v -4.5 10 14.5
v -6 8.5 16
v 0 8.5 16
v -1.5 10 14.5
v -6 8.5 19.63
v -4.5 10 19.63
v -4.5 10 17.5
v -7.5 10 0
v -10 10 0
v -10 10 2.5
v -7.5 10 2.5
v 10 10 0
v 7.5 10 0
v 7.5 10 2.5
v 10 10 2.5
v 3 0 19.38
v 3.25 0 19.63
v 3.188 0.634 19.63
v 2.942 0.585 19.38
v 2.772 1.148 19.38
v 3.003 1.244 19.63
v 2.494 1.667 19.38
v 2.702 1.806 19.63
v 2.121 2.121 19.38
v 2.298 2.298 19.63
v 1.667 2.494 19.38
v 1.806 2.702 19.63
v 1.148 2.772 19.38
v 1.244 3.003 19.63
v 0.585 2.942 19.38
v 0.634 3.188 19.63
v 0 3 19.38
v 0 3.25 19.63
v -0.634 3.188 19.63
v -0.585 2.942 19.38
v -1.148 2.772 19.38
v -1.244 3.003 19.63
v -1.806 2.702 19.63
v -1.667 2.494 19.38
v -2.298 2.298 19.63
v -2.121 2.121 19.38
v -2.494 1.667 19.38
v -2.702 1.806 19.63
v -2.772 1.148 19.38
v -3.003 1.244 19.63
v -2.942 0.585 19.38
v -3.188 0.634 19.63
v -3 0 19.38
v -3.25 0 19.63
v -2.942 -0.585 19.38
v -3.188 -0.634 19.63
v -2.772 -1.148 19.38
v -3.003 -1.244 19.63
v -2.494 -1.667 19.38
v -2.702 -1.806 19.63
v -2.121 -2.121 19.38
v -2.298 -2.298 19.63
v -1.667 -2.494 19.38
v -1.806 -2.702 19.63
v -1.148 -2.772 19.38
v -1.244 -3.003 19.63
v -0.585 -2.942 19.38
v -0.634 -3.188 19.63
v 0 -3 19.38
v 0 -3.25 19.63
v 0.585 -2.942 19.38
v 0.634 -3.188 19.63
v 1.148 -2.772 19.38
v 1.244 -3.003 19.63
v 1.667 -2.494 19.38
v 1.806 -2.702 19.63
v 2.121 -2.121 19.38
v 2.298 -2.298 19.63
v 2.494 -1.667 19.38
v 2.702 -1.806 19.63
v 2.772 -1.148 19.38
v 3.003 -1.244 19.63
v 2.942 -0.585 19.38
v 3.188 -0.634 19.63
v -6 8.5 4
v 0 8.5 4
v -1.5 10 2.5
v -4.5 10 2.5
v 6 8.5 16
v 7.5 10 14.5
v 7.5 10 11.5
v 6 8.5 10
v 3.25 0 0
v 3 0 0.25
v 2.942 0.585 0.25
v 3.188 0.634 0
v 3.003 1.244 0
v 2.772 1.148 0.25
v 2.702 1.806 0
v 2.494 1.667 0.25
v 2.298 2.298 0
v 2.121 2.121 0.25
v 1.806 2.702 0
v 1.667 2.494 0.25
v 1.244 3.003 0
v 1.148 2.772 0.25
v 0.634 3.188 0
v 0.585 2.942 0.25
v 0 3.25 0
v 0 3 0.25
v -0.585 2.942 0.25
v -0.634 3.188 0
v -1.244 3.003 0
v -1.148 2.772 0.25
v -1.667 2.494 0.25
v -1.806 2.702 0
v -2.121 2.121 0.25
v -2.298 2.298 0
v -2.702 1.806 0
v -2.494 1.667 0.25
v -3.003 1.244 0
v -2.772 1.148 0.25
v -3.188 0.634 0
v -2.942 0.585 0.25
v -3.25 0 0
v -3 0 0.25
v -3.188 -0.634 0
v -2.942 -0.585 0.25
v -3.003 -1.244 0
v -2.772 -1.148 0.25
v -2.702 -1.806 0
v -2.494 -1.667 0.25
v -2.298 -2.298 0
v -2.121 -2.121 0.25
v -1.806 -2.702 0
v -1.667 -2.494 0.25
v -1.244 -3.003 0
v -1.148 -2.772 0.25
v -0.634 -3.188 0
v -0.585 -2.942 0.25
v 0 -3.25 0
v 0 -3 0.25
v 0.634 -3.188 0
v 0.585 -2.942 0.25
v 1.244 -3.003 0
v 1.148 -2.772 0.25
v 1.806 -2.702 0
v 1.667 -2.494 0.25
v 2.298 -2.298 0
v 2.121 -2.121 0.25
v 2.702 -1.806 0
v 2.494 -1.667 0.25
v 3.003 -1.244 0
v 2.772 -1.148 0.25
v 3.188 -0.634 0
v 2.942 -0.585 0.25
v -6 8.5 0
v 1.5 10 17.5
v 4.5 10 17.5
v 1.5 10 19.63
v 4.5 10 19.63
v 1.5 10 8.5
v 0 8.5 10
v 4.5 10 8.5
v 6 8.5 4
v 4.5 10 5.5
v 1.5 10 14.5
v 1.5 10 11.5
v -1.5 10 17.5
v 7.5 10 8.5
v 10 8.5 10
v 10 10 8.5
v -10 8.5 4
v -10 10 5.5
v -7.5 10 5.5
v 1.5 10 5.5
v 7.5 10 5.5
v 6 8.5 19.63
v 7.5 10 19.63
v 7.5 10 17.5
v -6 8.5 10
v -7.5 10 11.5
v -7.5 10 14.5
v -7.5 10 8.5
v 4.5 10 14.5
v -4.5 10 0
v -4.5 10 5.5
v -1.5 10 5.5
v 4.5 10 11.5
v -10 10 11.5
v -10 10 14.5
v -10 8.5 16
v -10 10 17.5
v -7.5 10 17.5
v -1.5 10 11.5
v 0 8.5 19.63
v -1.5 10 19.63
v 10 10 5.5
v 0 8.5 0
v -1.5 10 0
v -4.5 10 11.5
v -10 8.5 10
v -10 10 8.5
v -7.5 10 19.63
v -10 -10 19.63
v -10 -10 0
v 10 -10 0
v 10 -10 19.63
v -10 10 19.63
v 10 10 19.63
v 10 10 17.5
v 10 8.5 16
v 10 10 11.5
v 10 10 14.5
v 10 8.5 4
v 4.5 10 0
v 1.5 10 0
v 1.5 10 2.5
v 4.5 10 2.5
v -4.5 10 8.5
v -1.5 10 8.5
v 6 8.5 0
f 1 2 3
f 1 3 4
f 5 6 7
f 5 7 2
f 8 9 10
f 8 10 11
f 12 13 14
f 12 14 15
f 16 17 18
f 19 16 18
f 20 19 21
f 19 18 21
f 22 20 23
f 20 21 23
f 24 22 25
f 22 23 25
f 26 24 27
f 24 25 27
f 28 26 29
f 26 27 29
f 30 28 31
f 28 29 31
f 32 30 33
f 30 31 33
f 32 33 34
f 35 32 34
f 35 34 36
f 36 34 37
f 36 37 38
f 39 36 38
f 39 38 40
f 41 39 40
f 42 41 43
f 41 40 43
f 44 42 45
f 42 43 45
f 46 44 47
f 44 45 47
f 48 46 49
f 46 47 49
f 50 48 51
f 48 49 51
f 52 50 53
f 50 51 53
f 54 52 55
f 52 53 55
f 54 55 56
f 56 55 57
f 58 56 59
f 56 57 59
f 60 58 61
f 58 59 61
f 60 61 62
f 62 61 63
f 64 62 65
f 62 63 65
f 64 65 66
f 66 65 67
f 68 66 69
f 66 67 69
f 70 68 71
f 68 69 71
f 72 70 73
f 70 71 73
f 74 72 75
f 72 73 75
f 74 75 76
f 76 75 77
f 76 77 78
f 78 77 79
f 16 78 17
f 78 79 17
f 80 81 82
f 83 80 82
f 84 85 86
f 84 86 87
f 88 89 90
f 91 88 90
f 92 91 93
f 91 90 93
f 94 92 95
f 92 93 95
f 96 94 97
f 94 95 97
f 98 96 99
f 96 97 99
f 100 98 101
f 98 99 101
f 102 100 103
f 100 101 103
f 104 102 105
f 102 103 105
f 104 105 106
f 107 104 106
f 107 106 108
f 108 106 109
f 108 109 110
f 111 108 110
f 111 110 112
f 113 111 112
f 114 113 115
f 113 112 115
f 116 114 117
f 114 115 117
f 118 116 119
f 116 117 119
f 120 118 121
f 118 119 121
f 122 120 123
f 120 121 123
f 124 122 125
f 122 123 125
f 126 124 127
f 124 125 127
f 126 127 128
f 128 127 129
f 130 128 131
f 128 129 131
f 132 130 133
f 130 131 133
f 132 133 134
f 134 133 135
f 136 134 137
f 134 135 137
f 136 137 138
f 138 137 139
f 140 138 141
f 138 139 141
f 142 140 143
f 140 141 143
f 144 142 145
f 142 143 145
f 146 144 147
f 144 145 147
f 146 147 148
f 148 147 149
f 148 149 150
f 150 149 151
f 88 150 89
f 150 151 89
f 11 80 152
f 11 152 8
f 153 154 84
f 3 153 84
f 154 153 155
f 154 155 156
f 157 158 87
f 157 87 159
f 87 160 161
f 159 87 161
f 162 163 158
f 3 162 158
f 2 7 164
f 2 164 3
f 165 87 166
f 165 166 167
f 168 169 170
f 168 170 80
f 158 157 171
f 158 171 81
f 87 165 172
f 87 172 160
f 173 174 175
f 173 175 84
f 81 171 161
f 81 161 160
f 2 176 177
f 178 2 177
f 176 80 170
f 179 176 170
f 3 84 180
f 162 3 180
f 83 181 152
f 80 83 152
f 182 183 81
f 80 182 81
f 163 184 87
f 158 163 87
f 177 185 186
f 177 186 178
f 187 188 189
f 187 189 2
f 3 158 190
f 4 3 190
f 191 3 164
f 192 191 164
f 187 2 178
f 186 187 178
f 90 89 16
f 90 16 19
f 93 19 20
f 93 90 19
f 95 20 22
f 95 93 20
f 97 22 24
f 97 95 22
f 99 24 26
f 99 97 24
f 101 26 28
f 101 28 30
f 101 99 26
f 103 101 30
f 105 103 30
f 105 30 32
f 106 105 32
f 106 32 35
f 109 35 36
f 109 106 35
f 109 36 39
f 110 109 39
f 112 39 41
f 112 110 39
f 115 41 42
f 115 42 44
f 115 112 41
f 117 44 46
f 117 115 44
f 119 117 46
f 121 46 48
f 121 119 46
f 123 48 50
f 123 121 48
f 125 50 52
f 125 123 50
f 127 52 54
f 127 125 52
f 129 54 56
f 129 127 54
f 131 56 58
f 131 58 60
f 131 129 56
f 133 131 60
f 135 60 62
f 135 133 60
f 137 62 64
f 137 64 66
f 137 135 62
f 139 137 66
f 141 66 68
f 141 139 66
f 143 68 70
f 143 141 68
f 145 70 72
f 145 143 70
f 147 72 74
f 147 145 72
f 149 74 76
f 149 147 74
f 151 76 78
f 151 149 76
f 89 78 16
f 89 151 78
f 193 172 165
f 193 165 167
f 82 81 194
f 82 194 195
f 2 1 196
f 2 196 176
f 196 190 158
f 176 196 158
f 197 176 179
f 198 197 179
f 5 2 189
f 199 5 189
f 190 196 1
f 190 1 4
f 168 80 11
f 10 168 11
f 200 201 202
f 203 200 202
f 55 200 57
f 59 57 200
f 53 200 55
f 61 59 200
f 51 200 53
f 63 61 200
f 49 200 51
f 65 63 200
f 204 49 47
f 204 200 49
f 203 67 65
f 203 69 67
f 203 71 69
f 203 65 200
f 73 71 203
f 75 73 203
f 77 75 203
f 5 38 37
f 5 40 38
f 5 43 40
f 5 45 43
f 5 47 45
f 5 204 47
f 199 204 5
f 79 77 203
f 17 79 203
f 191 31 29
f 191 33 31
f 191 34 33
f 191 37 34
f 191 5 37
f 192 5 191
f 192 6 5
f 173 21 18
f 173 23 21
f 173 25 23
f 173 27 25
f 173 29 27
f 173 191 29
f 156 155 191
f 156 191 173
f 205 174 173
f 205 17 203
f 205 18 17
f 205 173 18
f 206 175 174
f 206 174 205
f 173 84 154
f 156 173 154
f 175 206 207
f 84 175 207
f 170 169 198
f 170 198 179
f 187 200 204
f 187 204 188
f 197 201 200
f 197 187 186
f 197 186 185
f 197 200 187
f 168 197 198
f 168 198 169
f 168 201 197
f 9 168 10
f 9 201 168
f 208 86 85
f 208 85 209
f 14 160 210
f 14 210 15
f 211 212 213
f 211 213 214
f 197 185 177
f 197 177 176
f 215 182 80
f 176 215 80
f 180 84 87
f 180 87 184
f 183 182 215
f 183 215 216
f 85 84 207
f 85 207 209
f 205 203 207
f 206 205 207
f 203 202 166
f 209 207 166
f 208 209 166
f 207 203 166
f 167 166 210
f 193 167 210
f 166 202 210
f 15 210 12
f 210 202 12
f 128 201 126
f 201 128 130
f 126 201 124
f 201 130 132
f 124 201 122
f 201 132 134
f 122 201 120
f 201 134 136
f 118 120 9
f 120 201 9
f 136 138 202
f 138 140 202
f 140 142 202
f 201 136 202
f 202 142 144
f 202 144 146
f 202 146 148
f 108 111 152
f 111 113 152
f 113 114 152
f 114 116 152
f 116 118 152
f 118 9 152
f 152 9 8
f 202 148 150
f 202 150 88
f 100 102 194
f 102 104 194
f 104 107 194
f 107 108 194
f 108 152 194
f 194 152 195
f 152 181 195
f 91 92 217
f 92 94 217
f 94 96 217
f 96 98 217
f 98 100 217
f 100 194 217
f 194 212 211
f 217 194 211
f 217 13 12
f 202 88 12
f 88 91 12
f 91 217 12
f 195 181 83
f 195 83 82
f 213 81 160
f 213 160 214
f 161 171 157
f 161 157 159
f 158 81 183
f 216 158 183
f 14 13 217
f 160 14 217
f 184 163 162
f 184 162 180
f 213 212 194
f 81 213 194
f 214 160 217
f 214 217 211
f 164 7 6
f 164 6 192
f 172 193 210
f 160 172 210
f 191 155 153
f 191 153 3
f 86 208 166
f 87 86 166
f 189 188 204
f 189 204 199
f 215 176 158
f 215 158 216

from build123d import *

# Parameters (mm, degrees)
SKETCH1_W           = 20
SKETCH1_H           = 20
SKETCH1_R           = 3
BOSS_EXTRUDE1_DEPTH = 19.63
CUT_EXTRUDE1_DEPTH  = 26
CUT_EXTRUDE2_DEPTH  = 26
CHAMFER1_SIZE       = 0.25
CHAMFER2_SIZE       = 0.25


with BuildPart() as part:
    # Sketch1 → Boss-Extrude1 (new body)
    with BuildSketch(Plane.XY):
        Rectangle(SKETCH1_W, SKETCH1_H)
        Circle(SKETCH1_R, mode=Mode.SUBTRACT)
    extrude(amount=BOSS_EXTRUDE1_DEPTH)

    # Sketch2 → Cut-Extrude1 (cut)
    with BuildSketch(Plane(origin=(0, 0, 0), x_dir=(-1, 0, 0), z_dir=(0, 0, -1))):
        Polygon((-6, 8.5), (-4.5, 10), (-7.5, 10), align=None)
        Polygon((-1.5, 10), (0, 8.5), (1.5, 10), align=None)
        Polygon((7.5, 10), (4.5, 10), (6, 8.5), align=None)
    extrude(amount=-CUT_EXTRUDE1_DEPTH, mode=Mode.SUBTRACT)

    # Sketch3 → Cut-Extrude2 (cut)
    with BuildSketch(Plane(origin=(-10, 0, 10), x_dir=(0, 0, -1), z_dir=(1, 0, 0))):
        Polygon((7.5, 10), (4.5, 10), (6, 8.5), align=None)
        Polygon((-1.5, 10), (0, 8.5), (1.5, 10), align=None)
        Polygon((-6, 8.5), (-4.5, 10), (-7.5, 10), align=None)
    extrude(amount=CUT_EXTRUDE2_DEPTH, mode=Mode.SUBTRACT)

    # Chamfer1
    chamfer1_edges = [part.edges().sort_by_distance(p)[0] for p in [
        (-3, 0, 0),
    ]]
    chamfer(chamfer1_edges, length=CHAMFER1_SIZE)

    # Chamfer2
    chamfer2_edges = [part.edges().sort_by_distance(p)[0] for p in [
        (-3, 0, 19.63),
    ]]
    chamfer(chamfer2_edges, length=CHAMFER2_SIZE)


solid = part.part
